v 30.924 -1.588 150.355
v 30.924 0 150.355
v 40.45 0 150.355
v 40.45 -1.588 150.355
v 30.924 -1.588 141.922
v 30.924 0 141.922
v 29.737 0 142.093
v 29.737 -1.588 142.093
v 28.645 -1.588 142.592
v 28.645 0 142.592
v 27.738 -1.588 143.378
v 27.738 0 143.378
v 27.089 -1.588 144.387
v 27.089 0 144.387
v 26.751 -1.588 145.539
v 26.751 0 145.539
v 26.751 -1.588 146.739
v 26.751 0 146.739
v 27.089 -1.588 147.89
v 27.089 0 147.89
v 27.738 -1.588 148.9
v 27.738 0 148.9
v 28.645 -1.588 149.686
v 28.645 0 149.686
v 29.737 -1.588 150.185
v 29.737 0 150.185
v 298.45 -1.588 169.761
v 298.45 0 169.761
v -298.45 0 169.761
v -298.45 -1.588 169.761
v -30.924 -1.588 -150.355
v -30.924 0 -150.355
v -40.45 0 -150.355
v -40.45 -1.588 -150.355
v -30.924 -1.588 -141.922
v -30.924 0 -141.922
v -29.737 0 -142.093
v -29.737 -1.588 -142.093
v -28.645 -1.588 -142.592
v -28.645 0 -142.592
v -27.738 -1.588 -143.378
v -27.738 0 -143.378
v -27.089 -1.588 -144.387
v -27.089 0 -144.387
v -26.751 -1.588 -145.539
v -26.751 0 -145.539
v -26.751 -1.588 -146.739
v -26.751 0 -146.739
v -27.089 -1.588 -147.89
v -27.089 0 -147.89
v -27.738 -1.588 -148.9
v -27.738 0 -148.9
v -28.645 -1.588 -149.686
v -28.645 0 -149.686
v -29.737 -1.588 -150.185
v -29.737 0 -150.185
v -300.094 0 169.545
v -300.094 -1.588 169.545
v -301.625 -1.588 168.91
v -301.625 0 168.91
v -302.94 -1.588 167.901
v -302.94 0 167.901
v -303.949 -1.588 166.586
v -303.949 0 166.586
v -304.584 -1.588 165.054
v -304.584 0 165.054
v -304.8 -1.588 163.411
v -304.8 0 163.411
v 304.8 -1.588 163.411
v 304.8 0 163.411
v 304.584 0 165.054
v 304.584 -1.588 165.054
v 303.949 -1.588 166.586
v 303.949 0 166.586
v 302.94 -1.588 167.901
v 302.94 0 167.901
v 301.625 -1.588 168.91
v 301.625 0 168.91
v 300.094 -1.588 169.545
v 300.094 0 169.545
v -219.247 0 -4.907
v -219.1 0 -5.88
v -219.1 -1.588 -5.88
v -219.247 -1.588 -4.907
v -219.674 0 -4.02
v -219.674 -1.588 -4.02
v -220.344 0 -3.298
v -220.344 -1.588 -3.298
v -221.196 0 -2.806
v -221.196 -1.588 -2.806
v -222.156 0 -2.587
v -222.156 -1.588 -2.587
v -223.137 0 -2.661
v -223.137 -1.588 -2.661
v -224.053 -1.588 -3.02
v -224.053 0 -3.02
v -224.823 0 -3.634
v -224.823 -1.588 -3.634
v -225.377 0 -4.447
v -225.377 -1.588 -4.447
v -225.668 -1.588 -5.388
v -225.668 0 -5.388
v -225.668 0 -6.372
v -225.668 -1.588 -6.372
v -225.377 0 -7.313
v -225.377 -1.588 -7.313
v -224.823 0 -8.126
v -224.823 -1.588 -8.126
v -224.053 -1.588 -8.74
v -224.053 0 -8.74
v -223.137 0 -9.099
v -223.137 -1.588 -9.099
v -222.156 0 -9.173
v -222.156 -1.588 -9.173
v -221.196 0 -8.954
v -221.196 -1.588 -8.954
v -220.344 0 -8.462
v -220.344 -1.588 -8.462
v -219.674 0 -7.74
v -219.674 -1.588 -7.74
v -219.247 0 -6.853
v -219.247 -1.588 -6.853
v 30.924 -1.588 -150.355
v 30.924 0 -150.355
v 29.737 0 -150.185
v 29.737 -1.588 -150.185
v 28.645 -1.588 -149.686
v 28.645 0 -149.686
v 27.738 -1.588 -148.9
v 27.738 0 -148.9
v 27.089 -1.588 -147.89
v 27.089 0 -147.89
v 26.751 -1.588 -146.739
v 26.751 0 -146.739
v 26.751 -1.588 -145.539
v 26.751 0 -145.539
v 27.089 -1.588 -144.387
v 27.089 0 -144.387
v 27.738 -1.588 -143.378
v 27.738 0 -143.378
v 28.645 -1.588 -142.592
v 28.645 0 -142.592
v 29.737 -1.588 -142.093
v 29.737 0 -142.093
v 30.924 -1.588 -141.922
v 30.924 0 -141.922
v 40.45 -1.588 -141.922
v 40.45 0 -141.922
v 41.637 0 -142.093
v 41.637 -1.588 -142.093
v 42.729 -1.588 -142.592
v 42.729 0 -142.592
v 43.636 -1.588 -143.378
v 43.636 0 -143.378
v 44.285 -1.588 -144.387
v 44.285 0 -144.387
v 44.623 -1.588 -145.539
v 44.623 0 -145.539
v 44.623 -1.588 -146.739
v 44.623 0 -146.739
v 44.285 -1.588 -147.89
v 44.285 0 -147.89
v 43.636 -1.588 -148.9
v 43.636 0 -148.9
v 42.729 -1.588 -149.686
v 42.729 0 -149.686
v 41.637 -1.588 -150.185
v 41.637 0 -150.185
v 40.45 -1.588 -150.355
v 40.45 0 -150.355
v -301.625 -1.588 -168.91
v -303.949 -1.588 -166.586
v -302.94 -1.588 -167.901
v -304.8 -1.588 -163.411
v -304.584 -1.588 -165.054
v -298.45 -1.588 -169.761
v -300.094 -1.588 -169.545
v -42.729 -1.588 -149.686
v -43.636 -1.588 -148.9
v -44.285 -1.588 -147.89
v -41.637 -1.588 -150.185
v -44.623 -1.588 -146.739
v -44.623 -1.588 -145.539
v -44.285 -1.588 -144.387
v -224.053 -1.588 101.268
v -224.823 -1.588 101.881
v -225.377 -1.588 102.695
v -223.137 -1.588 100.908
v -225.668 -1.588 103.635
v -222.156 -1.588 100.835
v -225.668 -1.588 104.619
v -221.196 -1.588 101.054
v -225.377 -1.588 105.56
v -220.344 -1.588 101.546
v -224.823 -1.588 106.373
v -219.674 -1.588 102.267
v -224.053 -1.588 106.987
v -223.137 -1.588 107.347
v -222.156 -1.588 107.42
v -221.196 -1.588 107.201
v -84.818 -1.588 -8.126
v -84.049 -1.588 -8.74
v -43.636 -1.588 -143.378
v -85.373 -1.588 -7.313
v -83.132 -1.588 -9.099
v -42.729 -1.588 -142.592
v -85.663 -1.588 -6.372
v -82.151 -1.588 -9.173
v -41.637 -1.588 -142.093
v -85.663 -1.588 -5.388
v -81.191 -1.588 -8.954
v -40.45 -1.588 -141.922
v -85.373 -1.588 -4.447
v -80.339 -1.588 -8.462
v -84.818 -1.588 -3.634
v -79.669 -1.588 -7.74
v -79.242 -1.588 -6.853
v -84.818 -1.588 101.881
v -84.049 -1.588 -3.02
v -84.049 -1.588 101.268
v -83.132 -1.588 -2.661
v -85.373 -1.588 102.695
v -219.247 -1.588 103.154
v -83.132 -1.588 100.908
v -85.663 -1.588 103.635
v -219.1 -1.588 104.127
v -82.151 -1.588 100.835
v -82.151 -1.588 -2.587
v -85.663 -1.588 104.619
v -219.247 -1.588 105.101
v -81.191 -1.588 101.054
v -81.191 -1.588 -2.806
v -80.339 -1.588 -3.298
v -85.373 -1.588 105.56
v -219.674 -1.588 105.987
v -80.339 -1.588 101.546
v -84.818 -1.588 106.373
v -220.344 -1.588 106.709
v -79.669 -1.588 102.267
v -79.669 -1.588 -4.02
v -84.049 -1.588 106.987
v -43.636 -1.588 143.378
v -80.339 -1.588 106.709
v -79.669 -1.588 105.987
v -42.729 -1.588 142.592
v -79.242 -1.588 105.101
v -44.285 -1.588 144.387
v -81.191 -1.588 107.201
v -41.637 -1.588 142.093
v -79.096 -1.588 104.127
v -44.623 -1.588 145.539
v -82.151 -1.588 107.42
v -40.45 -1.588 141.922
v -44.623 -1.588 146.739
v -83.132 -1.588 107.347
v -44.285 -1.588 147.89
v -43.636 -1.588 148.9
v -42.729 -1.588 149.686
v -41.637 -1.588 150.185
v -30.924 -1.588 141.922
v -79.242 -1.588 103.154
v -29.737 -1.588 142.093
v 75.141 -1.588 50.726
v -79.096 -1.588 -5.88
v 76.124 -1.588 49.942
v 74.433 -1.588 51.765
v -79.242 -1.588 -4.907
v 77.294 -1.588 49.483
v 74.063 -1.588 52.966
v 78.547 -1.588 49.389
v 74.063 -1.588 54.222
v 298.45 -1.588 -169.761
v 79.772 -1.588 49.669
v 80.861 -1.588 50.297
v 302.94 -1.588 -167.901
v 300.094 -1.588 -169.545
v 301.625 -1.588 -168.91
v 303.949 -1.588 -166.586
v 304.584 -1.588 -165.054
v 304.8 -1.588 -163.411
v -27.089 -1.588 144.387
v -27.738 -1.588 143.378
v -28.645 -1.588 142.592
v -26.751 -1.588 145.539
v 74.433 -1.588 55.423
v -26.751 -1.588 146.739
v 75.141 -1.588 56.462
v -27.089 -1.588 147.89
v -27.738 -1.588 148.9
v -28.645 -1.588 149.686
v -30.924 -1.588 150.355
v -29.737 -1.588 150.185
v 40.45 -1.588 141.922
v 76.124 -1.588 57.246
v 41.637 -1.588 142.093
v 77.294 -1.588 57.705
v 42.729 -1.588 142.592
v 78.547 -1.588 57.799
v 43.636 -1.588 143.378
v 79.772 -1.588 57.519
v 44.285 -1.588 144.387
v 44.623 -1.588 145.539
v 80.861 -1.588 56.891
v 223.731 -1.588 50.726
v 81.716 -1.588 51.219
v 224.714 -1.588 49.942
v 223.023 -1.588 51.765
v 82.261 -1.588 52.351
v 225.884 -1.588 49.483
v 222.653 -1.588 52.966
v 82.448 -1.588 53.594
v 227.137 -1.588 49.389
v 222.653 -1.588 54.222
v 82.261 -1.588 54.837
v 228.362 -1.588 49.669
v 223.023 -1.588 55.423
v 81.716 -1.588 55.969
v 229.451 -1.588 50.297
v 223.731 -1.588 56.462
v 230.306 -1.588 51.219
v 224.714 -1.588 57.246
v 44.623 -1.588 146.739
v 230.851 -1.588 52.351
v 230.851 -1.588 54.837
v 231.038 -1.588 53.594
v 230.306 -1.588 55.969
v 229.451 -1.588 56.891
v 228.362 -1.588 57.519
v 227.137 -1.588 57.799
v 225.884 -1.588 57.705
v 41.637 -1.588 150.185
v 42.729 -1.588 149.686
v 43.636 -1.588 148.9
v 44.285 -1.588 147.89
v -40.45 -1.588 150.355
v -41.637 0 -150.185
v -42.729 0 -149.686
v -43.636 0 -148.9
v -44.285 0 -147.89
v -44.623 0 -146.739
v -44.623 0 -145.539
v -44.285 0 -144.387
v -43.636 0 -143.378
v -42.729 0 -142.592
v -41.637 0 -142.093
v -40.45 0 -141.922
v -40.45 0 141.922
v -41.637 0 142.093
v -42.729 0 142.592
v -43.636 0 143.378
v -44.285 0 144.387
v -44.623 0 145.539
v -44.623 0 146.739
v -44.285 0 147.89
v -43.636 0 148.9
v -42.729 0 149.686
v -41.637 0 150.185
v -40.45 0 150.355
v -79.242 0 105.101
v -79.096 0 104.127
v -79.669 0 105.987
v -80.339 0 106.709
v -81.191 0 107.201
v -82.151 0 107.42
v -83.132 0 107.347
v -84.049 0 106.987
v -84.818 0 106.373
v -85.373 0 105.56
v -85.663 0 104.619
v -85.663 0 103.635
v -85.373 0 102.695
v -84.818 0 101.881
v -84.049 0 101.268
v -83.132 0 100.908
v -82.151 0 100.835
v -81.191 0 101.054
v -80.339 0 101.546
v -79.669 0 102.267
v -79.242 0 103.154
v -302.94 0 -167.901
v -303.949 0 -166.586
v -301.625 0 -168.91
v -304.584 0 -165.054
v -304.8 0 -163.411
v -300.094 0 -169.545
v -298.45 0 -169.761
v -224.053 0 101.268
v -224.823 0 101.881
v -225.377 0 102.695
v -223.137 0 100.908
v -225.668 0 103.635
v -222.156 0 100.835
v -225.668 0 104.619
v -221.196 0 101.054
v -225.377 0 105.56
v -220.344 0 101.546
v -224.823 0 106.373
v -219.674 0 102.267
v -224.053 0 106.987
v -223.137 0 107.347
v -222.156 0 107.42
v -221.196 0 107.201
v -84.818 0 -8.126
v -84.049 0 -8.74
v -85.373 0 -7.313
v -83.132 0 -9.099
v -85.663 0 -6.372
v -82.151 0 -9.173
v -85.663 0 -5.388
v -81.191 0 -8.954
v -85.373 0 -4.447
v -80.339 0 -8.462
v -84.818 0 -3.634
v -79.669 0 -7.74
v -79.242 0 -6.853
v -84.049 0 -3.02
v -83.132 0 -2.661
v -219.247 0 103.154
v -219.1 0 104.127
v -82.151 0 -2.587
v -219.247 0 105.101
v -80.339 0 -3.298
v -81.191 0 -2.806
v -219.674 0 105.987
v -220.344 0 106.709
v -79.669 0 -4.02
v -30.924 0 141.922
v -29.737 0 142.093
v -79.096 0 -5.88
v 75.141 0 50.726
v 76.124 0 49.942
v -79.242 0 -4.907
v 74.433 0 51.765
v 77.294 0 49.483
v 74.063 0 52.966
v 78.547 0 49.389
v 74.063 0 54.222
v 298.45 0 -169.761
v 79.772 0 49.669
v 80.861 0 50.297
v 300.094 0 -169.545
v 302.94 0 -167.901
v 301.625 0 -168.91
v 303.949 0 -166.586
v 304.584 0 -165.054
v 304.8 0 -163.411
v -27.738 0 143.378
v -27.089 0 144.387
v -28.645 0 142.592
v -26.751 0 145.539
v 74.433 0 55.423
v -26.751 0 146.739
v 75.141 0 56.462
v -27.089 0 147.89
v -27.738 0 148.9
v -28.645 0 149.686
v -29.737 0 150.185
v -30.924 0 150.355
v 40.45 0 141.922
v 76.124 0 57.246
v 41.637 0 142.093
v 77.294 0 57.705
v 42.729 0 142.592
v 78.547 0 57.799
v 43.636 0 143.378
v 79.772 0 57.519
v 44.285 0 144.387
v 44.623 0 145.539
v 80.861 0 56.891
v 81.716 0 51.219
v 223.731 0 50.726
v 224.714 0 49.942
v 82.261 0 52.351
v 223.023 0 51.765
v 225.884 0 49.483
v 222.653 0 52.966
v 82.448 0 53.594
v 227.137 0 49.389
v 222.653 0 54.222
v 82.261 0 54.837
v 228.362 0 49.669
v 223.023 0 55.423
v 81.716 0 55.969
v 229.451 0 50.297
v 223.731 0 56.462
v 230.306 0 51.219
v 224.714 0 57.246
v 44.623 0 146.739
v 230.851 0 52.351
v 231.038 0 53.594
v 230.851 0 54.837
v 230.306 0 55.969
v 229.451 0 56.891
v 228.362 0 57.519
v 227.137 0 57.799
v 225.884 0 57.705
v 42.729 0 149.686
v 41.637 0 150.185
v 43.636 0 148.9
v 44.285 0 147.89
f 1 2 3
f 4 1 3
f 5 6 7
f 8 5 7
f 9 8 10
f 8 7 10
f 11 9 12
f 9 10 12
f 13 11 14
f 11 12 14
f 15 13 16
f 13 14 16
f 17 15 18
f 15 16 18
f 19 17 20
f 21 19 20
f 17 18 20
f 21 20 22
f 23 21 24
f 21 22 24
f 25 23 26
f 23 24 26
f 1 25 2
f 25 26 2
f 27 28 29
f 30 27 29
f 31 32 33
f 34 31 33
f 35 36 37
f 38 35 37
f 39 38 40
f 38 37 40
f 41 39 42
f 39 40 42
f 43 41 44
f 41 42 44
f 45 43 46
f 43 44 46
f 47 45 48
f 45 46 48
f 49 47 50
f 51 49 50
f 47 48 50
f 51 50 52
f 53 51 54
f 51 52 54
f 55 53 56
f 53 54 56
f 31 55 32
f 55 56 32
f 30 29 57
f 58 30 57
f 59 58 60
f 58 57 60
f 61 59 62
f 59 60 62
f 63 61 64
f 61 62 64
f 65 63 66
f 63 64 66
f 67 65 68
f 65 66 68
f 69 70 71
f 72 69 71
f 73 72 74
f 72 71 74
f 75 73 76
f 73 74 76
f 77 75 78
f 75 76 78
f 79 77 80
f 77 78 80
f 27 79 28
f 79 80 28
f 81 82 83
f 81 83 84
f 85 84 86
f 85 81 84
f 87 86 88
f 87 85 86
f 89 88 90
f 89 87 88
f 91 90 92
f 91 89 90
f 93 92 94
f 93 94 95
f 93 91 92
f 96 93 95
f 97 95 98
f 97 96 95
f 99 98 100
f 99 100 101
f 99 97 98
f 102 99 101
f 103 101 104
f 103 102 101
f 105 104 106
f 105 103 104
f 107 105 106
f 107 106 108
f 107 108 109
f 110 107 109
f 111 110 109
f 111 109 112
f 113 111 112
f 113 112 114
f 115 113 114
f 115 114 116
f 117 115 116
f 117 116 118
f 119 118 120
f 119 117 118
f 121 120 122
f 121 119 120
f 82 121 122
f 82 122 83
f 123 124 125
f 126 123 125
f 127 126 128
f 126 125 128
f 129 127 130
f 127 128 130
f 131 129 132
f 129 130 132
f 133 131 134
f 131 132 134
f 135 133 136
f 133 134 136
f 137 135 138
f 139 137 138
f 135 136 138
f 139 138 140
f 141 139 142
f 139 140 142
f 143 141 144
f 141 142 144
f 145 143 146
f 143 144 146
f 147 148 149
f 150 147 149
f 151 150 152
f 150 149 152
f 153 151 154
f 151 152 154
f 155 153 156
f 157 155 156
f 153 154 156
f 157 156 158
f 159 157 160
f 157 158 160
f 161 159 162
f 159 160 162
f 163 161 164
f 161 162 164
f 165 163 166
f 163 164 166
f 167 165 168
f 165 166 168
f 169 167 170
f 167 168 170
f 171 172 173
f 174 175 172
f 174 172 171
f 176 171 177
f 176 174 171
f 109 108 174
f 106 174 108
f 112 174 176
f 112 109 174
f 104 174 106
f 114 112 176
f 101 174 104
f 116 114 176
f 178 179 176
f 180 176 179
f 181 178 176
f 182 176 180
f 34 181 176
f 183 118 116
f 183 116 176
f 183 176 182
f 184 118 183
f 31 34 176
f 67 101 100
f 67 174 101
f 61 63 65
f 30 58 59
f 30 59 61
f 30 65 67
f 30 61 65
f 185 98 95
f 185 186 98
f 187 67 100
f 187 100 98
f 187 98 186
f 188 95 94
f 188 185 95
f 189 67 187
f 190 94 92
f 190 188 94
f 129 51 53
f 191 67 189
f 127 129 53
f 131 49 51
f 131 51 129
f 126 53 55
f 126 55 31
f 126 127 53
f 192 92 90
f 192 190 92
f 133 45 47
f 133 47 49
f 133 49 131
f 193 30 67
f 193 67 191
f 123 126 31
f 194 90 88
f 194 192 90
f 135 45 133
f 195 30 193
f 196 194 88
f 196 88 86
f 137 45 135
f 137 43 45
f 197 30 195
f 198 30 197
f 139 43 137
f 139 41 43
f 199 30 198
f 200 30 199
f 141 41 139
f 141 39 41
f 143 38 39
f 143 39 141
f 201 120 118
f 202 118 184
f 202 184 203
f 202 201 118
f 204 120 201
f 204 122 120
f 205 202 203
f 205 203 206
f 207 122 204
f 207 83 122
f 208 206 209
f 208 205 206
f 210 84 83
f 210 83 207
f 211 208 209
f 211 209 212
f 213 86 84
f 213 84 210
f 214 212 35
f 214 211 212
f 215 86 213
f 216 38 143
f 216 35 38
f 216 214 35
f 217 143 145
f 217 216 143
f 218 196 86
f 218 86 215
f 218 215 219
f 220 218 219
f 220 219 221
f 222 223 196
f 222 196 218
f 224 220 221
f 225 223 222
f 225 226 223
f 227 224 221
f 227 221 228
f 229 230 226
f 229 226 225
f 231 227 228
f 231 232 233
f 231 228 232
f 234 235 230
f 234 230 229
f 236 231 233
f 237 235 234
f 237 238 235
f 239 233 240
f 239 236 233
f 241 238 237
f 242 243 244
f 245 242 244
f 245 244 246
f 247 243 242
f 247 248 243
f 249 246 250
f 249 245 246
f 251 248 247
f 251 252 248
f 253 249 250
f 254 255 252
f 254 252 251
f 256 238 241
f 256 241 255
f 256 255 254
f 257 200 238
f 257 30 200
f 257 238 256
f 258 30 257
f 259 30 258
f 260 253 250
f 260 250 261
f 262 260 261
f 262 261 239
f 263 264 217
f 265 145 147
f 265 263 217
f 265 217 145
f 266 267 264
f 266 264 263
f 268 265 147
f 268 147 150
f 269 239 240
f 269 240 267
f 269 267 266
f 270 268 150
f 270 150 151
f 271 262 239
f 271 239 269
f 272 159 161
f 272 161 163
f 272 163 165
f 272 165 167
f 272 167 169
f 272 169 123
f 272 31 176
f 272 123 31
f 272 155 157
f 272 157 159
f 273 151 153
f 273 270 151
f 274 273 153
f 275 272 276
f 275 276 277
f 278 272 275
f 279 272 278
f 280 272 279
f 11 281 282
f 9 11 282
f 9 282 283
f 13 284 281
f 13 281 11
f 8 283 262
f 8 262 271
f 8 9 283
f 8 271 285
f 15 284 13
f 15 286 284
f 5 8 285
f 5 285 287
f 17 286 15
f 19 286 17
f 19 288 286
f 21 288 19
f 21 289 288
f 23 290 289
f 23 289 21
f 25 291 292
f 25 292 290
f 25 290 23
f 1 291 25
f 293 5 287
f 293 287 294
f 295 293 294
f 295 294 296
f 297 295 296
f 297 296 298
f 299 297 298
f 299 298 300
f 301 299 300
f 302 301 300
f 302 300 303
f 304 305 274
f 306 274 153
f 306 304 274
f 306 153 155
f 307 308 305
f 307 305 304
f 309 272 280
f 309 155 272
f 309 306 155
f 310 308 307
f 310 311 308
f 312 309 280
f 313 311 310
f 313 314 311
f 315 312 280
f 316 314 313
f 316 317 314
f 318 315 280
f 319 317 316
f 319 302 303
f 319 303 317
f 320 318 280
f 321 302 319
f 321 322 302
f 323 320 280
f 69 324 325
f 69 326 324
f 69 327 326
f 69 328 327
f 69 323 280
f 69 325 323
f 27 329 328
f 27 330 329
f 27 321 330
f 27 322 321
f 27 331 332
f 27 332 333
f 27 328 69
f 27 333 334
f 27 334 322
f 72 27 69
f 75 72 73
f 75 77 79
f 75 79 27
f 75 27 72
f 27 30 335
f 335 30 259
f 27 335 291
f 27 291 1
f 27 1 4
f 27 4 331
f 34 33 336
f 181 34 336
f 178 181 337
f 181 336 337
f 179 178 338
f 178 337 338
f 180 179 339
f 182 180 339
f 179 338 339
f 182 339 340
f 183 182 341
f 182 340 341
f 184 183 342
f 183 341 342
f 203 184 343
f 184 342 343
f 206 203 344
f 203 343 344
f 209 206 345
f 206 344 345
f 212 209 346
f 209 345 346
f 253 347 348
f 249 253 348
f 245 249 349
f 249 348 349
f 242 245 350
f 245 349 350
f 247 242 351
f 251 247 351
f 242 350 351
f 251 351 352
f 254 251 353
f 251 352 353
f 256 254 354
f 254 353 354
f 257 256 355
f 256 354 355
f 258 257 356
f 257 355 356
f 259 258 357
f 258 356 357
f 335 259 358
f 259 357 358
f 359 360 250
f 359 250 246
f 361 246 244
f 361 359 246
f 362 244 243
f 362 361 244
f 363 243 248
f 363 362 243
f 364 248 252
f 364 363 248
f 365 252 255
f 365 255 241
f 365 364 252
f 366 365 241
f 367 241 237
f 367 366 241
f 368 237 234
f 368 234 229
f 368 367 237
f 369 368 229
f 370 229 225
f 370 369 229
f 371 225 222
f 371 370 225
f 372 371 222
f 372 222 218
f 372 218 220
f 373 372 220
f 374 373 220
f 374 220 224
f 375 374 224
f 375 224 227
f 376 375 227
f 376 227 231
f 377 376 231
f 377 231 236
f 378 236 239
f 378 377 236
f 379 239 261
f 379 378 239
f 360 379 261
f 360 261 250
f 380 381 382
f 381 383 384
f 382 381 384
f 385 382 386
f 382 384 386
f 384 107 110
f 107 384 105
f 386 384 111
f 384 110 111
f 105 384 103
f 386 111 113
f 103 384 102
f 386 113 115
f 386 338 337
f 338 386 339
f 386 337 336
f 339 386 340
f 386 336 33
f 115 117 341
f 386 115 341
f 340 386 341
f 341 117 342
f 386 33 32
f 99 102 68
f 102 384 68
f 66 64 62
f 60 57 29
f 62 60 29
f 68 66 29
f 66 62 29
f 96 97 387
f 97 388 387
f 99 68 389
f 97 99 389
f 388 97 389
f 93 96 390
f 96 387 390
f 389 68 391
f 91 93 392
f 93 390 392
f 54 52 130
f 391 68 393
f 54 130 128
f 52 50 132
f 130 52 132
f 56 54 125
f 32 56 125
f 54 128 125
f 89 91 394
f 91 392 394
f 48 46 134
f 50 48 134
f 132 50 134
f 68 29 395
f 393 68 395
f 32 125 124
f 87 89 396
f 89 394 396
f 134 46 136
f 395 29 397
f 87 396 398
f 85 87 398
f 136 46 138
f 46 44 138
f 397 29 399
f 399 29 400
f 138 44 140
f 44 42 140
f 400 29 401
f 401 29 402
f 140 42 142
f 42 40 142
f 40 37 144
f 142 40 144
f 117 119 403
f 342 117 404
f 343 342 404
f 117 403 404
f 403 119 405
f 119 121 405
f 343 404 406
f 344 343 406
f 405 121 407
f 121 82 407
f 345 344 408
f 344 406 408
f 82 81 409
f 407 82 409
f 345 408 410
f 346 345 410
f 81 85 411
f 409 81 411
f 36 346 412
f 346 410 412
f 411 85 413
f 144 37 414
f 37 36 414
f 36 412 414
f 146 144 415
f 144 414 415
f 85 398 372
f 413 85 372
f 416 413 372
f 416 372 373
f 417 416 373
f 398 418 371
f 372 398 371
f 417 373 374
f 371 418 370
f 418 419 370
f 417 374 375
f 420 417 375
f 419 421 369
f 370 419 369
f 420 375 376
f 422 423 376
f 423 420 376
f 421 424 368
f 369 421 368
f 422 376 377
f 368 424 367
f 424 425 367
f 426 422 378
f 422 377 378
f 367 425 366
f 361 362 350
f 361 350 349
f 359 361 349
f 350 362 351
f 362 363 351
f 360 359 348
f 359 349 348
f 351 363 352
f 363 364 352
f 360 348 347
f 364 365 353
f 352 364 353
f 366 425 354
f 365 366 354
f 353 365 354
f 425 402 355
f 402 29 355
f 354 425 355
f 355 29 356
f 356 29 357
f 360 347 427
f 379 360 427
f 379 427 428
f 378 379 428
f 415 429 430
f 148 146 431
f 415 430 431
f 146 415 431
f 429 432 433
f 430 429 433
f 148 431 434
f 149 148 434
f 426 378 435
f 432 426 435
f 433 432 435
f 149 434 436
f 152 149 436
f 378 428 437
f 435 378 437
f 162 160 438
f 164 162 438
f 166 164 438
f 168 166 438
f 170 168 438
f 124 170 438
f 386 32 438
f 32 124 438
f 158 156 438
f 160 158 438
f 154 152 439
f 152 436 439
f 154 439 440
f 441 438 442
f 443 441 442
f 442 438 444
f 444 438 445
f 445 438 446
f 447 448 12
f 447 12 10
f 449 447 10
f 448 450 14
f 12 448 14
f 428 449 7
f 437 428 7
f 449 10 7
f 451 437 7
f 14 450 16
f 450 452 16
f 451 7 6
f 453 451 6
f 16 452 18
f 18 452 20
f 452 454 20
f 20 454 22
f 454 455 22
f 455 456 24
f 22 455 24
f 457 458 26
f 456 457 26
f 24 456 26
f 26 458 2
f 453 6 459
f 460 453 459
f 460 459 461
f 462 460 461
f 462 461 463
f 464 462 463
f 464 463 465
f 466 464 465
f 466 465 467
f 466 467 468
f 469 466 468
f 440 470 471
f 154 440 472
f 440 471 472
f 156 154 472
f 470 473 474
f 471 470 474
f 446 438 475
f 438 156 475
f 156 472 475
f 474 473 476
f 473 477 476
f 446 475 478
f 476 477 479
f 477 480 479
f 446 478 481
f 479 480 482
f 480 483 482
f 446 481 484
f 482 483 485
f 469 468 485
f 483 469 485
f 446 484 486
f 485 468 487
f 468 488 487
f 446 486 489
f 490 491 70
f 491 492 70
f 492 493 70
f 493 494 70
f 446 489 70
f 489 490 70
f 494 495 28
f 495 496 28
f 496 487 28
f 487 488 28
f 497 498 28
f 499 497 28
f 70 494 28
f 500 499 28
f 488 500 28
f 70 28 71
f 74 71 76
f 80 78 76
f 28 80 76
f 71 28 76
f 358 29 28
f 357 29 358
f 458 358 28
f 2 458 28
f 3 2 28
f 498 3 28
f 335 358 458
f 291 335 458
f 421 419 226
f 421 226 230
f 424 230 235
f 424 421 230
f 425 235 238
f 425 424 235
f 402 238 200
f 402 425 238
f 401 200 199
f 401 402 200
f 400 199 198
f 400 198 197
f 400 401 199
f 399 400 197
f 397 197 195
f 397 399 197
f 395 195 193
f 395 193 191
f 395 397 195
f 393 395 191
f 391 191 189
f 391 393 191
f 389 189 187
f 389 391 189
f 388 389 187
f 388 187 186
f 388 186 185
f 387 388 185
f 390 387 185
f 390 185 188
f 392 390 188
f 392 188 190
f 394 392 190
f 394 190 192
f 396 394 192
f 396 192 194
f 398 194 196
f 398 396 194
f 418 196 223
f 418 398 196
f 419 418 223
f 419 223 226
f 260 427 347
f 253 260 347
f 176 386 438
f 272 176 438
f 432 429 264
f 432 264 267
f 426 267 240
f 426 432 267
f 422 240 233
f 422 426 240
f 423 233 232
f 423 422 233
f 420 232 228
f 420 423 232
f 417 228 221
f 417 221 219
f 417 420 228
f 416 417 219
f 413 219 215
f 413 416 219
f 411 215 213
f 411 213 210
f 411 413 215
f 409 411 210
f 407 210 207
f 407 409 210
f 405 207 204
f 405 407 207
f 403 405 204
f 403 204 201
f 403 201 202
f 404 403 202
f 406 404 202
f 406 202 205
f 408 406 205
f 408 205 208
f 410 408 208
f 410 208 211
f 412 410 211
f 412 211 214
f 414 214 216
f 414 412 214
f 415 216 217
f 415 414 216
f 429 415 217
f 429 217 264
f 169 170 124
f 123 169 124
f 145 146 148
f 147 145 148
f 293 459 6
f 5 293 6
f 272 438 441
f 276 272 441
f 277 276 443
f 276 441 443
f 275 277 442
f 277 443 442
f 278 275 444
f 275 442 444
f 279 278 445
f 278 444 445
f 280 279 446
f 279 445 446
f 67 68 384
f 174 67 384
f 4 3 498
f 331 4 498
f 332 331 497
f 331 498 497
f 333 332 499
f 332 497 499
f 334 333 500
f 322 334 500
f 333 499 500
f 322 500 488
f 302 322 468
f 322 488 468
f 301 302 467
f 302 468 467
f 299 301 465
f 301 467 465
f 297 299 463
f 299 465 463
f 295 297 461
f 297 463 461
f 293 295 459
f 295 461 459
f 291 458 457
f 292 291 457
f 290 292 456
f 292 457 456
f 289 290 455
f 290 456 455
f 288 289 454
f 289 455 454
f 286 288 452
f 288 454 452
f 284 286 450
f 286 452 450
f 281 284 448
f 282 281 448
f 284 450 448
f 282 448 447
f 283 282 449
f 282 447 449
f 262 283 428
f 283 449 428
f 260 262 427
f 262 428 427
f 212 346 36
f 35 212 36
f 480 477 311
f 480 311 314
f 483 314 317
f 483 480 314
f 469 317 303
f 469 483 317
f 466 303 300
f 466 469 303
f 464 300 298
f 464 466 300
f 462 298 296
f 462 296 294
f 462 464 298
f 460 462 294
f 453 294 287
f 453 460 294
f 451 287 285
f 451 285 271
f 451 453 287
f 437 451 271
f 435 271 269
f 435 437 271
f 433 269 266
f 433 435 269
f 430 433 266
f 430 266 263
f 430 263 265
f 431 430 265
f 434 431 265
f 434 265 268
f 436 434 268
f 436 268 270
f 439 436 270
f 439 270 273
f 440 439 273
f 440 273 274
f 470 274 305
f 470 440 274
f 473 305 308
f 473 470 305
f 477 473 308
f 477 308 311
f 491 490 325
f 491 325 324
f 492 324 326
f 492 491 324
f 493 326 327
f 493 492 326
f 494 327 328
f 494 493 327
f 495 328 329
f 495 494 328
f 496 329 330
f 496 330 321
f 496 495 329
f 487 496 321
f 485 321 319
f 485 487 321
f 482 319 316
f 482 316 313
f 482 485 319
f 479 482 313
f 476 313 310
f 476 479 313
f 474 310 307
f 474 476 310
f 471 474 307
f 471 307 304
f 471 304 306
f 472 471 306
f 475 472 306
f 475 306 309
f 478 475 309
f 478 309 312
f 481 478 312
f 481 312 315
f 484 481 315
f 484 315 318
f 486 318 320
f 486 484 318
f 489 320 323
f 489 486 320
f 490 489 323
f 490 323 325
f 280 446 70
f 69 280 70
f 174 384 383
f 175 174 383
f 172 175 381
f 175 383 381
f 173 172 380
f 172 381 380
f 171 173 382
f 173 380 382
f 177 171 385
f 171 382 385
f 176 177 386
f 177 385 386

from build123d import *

# Parameters (mm, degrees)
F0_R     = 3.302
F0_R_2   = 4.2164
F1_DEPTH = 1.5875


with BuildPart() as f1:
    # F0 (on Front) → F1 (new body)
    with BuildSketch(Plane.XZ):
        with BuildLine():
            ThreePointArc((304.8, 163.4109), (302.940128, 167.901028), (298.45, 169.7609))
            Line((298.45, 169.7609), (-298.45, 169.7609))
            ThreePointArc((-298.45, 169.7609), (-302.940128, 167.901028), (-304.8, 163.4109))
            Line((-304.8, 163.4109), (-304.8, -163.4109))
            ThreePointArc((-304.8, -163.4109), (-302.940128, -167.901028), (-298.45, -169.7609))
            Line((-298.45, -169.7609), (298.45, -169.7609))
            ThreePointArc((298.45, -169.7609), (302.940128, -167.901028), (304.8, -163.4109))
            Line((304.8, -163.4109), (304.8, 163.4109))
        make_face()
        with BuildLine():
            Line((-30.9245, -150.3553), (-40.4495, -150.3553))
            ThreePointArc((-40.4495, -150.3553), (-44.6659, -146.1389), (-40.4495, -141.9225))
            Line((-40.4495, -141.9225), (-30.9245, -141.9225))
            ThreePointArc((-30.9245, -141.9225), (-26.7081, -146.1389), (-30.9245, -150.3553))
        make_face(mode=Mode.SUBTRACT)
        with Locations((-222.4024, -5.8801)):
            Circle(F0_R, mode=Mode.SUBTRACT)
        with Locations((-82.3976, -5.8801)):
            Circle(F0_R, mode=Mode.SUBTRACT)
        with BuildLine():
            Line((40.4495, -150.3553), (30.9245, -150.3553))
            ThreePointArc((30.9245, -150.3553), (26.7081, -146.1389), (30.9245, -141.9225))
            Line((30.9245, -141.9225), (40.4495, -141.9225))
            ThreePointArc((40.4495, -141.9225), (44.6659, -146.1389), (40.4495, -150.3553))
        make_face(mode=Mode.SUBTRACT)
        with Locations((-222.4024, 104.1273)):
            Circle(F0_R, mode=Mode.SUBTRACT)
        with Locations((-82.3976, 104.1273)):
            Circle(F0_R, mode=Mode.SUBTRACT)
        with BuildLine():
            Line((-30.9245, 141.9225), (-40.4495, 141.9225))
            ThreePointArc((-40.4495, 141.9225), (-44.6659, 146.1389), (-40.4495, 150.3553))
            Line((-40.4495, 150.3553), (-30.9245, 150.3553))
            ThreePointArc((-30.9245, 150.3553), (-26.7081, 146.1389), (-30.9245, 141.9225))
        make_face(mode=Mode.SUBTRACT)
        with Locations((78.232, 53.594)):
            Circle(F0_R_2, mode=Mode.SUBTRACT)
        with Locations((226.822, 53.594)):
            Circle(F0_R_2, mode=Mode.SUBTRACT)
        with BuildLine():
            Line((40.4495, 141.9225), (30.9245, 141.9225))
            ThreePointArc((30.9245, 141.9225), (26.7081, 146.1389), (30.9245, 150.3553))
            Line((30.9245, 150.3553), (40.4495, 150.3553))
            ThreePointArc((40.4495, 150.3553), (44.6659, 146.1389), (40.4495, 141.9225))
        make_face(mode=Mode.SUBTRACT)
    extrude(amount=F1_DEPTH)


solid = f1.part
